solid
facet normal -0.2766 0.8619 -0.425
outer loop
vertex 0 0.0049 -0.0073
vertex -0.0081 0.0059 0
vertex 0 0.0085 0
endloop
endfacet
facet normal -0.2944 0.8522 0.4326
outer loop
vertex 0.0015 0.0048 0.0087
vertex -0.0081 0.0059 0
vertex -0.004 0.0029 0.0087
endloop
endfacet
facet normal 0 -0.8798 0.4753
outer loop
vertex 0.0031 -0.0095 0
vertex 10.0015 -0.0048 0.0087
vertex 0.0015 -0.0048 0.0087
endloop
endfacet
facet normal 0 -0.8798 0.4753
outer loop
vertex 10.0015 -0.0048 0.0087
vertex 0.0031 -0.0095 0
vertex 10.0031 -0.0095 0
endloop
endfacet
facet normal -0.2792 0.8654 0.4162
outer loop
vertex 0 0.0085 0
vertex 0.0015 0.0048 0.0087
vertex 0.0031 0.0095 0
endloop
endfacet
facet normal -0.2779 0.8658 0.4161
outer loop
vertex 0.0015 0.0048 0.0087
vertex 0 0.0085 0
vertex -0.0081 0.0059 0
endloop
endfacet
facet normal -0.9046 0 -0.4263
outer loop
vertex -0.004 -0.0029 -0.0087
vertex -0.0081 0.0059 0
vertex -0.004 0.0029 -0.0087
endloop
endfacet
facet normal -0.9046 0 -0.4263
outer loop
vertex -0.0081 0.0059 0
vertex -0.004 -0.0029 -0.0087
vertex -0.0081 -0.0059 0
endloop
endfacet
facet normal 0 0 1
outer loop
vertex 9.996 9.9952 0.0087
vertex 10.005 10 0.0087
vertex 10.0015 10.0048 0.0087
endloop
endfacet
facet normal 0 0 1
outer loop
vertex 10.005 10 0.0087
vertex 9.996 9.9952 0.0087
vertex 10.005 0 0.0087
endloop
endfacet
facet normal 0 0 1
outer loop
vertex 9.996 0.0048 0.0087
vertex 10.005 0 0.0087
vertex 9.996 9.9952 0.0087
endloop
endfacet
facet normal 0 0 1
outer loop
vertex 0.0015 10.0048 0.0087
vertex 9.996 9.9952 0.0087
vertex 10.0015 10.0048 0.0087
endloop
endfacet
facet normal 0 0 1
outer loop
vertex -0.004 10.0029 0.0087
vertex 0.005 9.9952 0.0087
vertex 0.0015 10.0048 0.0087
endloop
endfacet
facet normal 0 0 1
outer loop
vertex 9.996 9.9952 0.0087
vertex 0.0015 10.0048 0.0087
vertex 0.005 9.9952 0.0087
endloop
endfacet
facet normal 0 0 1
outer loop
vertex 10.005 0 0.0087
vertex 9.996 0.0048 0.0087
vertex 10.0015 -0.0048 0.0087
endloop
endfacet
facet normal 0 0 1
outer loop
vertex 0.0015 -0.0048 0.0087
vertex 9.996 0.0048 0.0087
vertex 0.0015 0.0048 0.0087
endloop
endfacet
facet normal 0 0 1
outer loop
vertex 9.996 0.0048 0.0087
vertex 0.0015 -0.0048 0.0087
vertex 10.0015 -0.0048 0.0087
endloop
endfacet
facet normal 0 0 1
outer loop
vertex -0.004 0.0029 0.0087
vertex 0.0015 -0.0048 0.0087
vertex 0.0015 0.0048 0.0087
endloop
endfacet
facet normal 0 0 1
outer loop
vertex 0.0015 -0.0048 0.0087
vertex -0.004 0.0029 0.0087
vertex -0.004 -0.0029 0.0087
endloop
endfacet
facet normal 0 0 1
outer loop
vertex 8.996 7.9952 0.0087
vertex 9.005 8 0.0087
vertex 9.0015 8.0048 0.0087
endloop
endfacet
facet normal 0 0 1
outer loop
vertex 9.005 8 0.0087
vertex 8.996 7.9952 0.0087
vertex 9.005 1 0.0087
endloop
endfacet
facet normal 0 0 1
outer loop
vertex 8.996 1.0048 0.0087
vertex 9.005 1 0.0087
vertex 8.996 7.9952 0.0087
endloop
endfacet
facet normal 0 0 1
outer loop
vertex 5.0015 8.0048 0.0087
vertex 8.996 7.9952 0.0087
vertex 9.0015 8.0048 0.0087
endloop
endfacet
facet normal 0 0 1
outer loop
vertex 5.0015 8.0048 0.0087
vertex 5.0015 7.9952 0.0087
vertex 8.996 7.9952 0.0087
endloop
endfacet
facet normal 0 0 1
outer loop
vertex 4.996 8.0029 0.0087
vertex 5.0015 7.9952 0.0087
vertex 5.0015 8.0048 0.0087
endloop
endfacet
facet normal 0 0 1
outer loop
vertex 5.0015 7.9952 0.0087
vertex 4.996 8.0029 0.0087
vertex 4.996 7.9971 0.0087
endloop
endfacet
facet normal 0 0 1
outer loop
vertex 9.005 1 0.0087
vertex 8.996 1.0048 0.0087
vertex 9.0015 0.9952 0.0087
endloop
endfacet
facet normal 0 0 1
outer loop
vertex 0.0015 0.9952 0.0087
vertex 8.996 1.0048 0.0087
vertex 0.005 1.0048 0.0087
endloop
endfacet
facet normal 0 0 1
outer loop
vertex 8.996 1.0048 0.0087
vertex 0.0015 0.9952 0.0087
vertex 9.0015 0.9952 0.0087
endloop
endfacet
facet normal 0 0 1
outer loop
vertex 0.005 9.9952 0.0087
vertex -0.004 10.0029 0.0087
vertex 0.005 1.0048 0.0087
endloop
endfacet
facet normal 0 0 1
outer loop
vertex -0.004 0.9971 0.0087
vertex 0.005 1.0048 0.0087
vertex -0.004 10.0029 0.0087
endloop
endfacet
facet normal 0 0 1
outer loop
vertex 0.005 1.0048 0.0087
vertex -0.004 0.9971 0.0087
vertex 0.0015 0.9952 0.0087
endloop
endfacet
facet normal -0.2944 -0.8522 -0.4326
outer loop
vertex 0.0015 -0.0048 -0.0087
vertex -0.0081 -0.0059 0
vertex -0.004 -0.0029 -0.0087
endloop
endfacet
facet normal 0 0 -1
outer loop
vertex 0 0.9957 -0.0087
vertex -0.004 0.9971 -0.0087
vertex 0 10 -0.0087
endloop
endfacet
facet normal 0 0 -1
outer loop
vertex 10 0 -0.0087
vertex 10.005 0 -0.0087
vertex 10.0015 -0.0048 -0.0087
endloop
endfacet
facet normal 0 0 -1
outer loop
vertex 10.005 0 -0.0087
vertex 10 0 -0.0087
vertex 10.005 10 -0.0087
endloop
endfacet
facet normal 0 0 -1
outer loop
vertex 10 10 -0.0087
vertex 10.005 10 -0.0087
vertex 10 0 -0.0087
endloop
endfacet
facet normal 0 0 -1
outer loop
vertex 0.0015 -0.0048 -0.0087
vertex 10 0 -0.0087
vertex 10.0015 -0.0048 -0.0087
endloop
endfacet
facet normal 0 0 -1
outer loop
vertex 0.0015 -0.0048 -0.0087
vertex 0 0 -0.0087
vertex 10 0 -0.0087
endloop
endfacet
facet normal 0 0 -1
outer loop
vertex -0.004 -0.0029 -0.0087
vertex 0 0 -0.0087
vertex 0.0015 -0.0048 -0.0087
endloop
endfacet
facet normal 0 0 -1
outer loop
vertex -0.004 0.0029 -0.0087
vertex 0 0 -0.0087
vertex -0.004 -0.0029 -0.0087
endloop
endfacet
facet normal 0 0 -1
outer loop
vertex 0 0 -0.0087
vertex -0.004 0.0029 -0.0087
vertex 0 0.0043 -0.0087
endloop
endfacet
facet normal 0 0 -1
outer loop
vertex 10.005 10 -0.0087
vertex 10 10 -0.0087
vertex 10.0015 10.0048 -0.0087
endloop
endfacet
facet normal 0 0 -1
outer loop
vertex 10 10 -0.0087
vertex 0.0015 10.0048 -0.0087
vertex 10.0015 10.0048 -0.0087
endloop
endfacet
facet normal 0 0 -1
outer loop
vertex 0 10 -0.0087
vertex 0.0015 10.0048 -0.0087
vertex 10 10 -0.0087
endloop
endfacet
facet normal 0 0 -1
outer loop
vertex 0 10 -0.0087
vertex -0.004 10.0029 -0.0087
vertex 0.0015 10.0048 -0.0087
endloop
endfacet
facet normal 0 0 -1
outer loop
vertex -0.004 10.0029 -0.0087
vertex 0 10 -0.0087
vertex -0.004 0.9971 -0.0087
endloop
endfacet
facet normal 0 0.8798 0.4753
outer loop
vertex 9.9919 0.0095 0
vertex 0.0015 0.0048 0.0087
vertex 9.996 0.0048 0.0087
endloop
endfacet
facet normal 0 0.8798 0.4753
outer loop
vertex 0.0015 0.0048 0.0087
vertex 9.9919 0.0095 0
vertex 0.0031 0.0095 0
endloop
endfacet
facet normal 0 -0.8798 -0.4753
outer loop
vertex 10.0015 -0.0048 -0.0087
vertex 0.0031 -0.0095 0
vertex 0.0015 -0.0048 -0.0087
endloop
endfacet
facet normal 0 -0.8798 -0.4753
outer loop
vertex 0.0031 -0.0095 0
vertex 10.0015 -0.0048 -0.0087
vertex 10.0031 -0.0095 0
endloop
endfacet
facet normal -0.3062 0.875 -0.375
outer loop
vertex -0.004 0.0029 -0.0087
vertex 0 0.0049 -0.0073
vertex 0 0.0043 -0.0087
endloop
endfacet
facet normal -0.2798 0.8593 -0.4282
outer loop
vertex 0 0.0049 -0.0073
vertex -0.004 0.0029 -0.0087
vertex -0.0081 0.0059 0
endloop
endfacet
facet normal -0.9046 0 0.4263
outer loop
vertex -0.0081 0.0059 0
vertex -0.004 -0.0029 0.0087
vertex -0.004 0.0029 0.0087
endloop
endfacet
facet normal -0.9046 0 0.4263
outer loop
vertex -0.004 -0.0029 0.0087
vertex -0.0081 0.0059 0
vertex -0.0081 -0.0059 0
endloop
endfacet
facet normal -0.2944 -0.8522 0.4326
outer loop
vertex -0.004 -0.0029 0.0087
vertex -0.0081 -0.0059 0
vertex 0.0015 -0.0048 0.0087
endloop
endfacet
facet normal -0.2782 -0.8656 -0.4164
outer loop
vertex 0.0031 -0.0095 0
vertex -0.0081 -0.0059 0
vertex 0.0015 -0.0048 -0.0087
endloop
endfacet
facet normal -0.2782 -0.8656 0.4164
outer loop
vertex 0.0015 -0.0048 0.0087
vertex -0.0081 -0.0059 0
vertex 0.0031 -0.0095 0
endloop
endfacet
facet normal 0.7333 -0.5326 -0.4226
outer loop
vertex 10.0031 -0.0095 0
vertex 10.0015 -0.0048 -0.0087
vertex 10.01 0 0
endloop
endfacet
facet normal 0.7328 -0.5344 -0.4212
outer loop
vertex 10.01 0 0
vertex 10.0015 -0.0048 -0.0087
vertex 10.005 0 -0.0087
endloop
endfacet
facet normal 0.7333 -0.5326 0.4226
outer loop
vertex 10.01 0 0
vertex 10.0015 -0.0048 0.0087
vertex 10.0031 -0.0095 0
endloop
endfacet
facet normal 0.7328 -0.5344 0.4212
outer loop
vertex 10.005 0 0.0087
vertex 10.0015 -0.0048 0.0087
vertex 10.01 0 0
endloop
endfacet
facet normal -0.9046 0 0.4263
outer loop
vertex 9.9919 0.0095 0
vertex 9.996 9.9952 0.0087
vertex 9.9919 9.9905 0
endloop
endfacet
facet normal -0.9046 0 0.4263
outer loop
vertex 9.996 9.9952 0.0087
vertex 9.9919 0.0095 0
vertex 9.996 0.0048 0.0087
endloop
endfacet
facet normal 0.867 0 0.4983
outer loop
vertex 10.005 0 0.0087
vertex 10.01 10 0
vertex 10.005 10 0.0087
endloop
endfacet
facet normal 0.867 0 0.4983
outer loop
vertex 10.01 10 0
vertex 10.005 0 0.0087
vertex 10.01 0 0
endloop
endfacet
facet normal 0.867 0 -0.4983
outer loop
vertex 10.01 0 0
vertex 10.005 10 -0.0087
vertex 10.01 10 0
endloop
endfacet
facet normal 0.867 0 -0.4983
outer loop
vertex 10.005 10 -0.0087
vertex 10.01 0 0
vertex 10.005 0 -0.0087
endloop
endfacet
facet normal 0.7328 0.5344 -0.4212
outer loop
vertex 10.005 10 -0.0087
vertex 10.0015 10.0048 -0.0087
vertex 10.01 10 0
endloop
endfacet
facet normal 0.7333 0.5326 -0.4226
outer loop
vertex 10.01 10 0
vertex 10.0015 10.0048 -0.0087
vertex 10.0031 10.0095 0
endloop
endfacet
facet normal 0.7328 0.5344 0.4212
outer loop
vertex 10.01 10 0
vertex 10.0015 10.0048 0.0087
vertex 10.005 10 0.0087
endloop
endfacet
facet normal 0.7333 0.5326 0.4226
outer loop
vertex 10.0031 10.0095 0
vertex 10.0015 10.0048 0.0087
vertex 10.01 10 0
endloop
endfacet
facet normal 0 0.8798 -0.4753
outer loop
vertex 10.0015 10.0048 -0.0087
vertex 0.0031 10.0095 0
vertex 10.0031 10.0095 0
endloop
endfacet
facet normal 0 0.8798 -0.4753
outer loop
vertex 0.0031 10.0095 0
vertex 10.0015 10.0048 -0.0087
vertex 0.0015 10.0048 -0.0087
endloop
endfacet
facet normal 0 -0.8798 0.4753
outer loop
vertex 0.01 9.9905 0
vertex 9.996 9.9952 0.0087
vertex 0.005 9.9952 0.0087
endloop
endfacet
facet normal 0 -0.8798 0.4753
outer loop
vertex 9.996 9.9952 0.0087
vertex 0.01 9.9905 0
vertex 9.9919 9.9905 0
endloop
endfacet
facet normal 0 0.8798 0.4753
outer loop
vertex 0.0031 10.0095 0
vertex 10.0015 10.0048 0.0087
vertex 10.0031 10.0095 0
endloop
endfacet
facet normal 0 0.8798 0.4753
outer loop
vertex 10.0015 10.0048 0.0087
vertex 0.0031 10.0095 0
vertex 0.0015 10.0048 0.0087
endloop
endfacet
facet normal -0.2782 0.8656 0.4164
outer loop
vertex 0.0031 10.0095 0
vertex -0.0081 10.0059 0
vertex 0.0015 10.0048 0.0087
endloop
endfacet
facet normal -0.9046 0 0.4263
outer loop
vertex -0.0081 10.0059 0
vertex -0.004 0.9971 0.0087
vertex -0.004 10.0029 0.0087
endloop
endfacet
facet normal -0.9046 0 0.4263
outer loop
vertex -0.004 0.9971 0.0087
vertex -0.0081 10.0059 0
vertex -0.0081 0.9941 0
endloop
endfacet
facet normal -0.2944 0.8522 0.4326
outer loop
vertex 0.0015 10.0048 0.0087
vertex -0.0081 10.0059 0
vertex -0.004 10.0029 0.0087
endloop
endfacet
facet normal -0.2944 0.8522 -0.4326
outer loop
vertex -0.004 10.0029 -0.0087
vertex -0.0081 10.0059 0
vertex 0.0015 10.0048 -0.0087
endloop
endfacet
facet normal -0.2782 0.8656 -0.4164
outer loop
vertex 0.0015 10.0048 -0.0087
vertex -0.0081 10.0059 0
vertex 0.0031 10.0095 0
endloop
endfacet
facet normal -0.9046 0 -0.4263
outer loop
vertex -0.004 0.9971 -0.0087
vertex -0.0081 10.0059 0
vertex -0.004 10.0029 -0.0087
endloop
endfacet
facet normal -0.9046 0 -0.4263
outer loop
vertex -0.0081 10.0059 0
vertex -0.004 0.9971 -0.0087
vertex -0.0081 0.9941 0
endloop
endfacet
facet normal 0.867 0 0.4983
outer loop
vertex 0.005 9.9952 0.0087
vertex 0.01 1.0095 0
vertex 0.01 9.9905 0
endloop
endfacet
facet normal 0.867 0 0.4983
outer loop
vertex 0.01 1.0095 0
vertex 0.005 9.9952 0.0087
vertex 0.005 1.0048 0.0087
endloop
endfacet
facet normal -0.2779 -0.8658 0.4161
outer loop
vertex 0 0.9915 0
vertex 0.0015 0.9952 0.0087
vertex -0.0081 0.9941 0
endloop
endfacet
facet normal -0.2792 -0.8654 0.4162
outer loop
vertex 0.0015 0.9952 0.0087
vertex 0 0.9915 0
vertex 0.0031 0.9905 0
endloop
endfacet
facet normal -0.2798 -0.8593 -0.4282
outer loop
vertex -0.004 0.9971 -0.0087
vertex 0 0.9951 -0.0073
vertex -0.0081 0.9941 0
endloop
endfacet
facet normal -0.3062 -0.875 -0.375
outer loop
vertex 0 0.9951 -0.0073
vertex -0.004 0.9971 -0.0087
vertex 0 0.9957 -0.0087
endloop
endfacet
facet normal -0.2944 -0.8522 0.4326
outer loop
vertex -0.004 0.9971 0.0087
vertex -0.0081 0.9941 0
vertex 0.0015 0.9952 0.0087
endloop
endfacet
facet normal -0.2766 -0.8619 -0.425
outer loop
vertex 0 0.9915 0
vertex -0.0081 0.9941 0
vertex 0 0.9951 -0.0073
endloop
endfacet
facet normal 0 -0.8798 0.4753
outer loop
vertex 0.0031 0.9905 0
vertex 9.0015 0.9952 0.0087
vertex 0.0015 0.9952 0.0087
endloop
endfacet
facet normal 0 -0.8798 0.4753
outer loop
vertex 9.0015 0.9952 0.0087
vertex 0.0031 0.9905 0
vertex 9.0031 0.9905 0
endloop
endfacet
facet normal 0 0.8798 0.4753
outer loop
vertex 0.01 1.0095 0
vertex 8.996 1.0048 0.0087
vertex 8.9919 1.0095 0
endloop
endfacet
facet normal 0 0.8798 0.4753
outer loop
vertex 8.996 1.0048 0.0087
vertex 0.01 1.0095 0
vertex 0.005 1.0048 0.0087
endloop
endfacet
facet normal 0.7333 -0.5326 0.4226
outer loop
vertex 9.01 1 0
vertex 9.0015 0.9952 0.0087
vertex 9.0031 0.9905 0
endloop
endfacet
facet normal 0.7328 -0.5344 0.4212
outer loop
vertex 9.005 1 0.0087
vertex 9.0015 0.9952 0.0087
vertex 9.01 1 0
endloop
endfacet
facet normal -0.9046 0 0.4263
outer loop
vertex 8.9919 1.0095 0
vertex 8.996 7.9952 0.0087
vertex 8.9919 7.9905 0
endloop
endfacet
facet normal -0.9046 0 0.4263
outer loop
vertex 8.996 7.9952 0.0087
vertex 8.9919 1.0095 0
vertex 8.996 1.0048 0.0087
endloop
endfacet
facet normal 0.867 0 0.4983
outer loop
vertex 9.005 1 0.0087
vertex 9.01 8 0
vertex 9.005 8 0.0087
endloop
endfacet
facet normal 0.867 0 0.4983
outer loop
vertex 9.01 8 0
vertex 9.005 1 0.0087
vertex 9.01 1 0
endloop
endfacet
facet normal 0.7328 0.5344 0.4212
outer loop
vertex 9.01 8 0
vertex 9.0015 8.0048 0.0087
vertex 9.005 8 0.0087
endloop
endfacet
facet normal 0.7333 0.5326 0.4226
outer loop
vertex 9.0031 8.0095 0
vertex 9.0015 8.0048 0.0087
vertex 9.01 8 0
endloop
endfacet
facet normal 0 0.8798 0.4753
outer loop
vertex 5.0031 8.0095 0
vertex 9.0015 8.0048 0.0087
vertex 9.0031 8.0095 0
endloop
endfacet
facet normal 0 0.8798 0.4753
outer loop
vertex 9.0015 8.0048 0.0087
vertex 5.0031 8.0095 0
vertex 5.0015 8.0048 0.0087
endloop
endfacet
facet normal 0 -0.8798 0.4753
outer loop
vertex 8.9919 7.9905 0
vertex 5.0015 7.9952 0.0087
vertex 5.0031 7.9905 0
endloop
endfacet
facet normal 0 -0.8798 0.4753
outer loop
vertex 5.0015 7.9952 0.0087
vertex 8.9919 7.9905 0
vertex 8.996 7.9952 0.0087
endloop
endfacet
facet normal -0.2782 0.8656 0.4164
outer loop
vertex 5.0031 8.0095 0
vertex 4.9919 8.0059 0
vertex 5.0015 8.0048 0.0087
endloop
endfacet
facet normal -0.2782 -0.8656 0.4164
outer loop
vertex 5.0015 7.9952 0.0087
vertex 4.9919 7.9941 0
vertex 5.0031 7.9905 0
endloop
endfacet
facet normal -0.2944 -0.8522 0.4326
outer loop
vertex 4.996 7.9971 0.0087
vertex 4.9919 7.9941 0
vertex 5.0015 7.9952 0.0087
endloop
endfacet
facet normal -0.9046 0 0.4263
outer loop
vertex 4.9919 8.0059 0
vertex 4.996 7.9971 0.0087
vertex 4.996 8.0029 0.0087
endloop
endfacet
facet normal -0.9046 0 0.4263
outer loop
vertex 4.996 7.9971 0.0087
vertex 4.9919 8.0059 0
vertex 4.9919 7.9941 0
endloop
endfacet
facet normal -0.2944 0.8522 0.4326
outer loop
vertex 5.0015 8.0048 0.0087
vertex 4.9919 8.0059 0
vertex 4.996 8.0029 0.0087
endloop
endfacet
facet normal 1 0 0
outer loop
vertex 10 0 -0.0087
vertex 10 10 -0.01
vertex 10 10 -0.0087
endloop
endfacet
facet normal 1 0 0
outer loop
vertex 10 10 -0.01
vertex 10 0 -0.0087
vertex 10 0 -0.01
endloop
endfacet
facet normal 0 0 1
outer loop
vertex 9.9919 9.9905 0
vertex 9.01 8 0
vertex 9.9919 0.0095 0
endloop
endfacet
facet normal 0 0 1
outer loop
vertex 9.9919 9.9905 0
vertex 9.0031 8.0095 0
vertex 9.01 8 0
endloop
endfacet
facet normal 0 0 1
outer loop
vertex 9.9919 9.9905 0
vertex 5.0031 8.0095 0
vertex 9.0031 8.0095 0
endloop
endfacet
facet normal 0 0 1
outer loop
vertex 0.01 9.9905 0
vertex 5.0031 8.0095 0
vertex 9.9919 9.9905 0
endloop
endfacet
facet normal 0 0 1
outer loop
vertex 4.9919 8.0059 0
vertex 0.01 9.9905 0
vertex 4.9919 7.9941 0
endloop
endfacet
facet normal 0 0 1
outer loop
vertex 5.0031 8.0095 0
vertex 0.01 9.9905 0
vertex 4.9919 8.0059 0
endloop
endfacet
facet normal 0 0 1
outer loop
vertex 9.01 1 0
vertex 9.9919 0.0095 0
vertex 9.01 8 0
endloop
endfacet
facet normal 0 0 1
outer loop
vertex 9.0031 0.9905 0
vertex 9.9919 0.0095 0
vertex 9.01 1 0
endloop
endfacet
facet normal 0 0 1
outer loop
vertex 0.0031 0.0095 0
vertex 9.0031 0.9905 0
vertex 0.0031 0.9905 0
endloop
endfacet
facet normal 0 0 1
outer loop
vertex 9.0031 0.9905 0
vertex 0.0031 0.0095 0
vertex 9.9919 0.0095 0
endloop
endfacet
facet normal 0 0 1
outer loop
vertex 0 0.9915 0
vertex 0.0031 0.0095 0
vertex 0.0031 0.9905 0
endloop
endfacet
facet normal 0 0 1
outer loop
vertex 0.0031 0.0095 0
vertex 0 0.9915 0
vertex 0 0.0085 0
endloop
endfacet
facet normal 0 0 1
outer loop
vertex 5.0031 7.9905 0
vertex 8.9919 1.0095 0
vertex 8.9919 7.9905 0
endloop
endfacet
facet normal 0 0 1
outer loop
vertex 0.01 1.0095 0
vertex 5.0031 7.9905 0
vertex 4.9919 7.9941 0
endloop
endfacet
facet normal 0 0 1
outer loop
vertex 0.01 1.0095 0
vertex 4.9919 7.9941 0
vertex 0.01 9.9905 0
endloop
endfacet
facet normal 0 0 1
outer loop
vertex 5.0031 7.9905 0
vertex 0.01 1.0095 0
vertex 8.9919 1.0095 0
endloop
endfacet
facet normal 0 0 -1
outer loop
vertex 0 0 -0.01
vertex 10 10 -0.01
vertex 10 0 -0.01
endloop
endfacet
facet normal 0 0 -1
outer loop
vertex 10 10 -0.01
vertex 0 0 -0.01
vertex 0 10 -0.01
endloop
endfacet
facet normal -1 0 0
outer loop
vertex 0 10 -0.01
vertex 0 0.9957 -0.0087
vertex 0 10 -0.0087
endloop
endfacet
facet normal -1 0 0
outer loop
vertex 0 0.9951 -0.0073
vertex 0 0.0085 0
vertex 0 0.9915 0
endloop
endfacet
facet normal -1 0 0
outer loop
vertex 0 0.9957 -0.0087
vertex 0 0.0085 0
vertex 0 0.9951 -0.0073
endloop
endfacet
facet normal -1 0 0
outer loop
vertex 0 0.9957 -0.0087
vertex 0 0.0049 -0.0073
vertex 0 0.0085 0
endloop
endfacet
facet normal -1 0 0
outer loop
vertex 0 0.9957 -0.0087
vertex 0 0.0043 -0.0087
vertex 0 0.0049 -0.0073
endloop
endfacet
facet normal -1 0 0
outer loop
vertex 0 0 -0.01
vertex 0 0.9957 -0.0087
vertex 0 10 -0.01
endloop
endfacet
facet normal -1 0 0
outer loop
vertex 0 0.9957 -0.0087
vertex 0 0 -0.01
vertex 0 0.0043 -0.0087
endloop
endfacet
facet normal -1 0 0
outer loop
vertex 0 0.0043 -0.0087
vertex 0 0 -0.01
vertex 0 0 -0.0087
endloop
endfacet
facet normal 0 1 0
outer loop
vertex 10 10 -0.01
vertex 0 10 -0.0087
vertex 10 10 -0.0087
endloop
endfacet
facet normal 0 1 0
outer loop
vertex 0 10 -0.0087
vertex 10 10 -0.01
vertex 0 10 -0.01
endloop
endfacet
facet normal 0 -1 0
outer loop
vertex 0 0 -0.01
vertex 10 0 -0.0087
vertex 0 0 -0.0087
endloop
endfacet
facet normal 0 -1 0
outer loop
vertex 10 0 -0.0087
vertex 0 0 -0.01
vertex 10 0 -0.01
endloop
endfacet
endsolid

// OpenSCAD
hull(){
    translate([0.0, 0.0]) sphere(0.01);
    translate([1.0, 0.0]) sphere(0.01);
}
hull(){
    translate([1.0, 0.0]) sphere(0.01);
    translate([2.0, 0.0]) sphere(0.01);
}
hull(){
    translate([2.0, 0.0]) sphere(0.01);
    translate([3.0, 0.0]) sphere(0.01);
}
hull(){
    translate([3.0, 0.0]) sphere(0.01);
    translate([4.0, 0.0]) sphere(0.01);
}
hull(){
    translate([4.0, 0.0]) sphere(0.01);
    translate([5.0, 0.0]) sphere(0.01);
}
hull(){
    translate([5.0, 0.0]) sphere(0.01);
    translate([6.0, 0.0]) sphere(0.01);
}
hull(){
    translate([6.0, 0.0]) sphere(0.01);
    translate([7.0, 0.0]) sphere(0.01);
}
hull(){
    translate([7.0, 0.0]) sphere(0.01);
    translate([8.0, 0.0]) sphere(0.01);
}
hull(){
    translate([8.0, 0.0]) sphere(0.01);
    translate([9.0, 0.0]) sphere(0.01);
}
hull(){
    translate([9.0, 0.0]) sphere(0.01);
    translate([10.0, 0.0]) sphere(0.01);
}
hull(){
    translate([10.0, 0.0]) sphere(0.01);
    translate([10.0, 1.0]) sphere(0.01);
}
hull(){
    translate([10.0, 1.0]) sphere(0.01);
    translate([10.0, 2.0]) sphere(0.01);
}
hull(){
    translate([10.0, 2.0]) sphere(0.01);
    translate([10.0, 3.0]) sphere(0.01);
}
hull(){
    translate([10.0, 3.0]) sphere(0.01);
    translate([10.0, 4.0]) sphere(0.01);
}
hull(){
    translate([10.0, 4.0]) sphere(0.01);
    translate([10.0, 5.0]) sphere(0.01);
}
hull(){
    translate([10.0, 5.0]) sphere(0.01);
    translate([10.0, 6.0]) sphere(0.01);
}
hull(){
    translate([10.0, 6.0]) sphere(0.01);
    translate([10.0, 7.0]) sphere(0.01);
}
hull(){
    translate([10.0, 7.0]) sphere(0.01);
    translate([10.0, 8.0]) sphere(0.01);
}
hull(){
    translate([10.0, 8.0]) sphere(0.01);
    translate([10.0, 9.0]) sphere(0.01);
}
hull(){
    translate([10.0, 9.0]) sphere(0.01);
    translate([10.0, 10.0]) sphere(0.01);
}
hull(){
    translate([10.0, 10.0]) sphere(0.01);
    translate([9.0, 10.0]) sphere(0.01);
}
hull(){
    translate([9.0, 10.0]) sphere(0.01);
    translate([8.0, 10.0]) sphere(0.01);
}
hull(){
    translate([8.0, 10.0]) sphere(0.01);
    translate([7.0, 10.0]) sphere(0.01);
}
hull(){
    translate([7.0, 10.0]) sphere(0.01);
    translate([6.0, 10.0]) sphere(0.01);
}
hull(){
    translate([6.0, 10.0]) sphere(0.01);
    translate([5.0, 10.0]) sphere(0.01);
}
hull(){
    translate([5.0, 10.0]) sphere(0.01);
    translate([4.0, 10.0]) sphere(0.01);
}
hull(){
    translate([4.0, 10.0]) sphere(0.01);
    translate([3.0, 10.0]) sphere(0.01);
}
hull(){
    translate([3.0, 10.0]) sphere(0.01);
    translate([2.0, 10.0]) sphere(0.01);
}
hull(){
    translate([2.0, 10.0]) sphere(0.01);
    translate([1.0, 10.0]) sphere(0.01);
}
hull(){
    translate([1.0, 10.0]) sphere(0.01);
    translate([0.0, 10.0]) sphere(0.01);
}
hull(){
    translate([0.0, 10.0]) sphere(0.01);
    translate([0.0, 9.0]) sphere(0.01);
}
hull(){
    translate([0.0, 9.0]) sphere(0.01);
    translate([0.0, 8.0]) sphere(0.01);
}
hull(){
    translate([0.0, 8.0]) sphere(0.01);
    translate([0.0, 7.0]) sphere(0.01);
}
hull(){
    translate([0.0, 7.0]) sphere(0.01);
    translate([0.0, 6.0]) sphere(0.01);
}
hull(){
    translate([0.0, 6.0]) sphere(0.01);
    translate([0.0, 5.0]) sphere(0.01);
}
hull(){
    translate([0.0, 5.0]) sphere(0.01);
    translate([0.0, 4.0]) sphere(0.01);
}
hull(){
    translate([0.0, 4.0]) sphere(0.01);
    translate([0.0, 3.0]) sphere(0.01);
}
hull(){
    translate([0.0, 3.0]) sphere(0.01);
    translate([0.0, 2.0]) sphere(0.01);
}
hull(){
    translate([0.0, 2.0]) sphere(0.01);
    translate([0.0, 1.0]) sphere(0.01);
}
hull(){
    translate([0.0, 1.0]) sphere(0.01);
    translate([1.0, 1.0]) sphere(0.01);
}
hull(){
    translate([1.0, 1.0]) sphere(0.01);
    translate([2.0, 1.0]) sphere(0.01);
}
hull(){
    translate([2.0, 1.0]) sphere(0.01);
    translate([3.0, 1.0]) sphere(0.01);
}
hull(){
    translate([3.0, 1.0]) sphere(0.01);
    translate([4.0, 1.0]) sphere(0.01);
}
hull(){
    translate([4.0, 1.0]) sphere(0.01);
    translate([5.0, 1.0]) sphere(0.01);
}
hull(){
    translate([5.0, 1.0]) sphere(0.01);
    translate([6.0, 1.0]) sphere(0.01);
}
hull(){
    translate([6.0, 1.0]) sphere(0.01);
    translate([7.0, 1.0]) sphere(0.01);
}
hull(){
    translate([7.0, 1.0]) sphere(0.01);
    translate([8.0, 1.0]) sphere(0.01);
}
hull(){
    translate([8.0, 1.0]) sphere(0.01);
    translate([9.0, 1.0]) sphere(0.01);
}
hull(){
    translate([9.0, 1.0]) sphere(0.01);
    translate([9.0, 2.0]) sphere(0.01);
}
hull(){
    translate([9.0, 2.0]) sphere(0.01);
    translate([9.0, 3.0]) sphere(0.01);
}
hull(){
    translate([9.0, 3.0]) sphere(0.01);
    translate([9.0, 4.0]) sphere(0.01);
}
hull(){
    translate([9.0, 4.0]) sphere(0.01);
    translate([9.0, 5.0]) sphere(0.01);
}
hull(){
    translate([9.0, 5.0]) sphere(0.01);
    translate([9.0, 6.0]) sphere(0.01);
}
hull(){
    translate([9.0, 6.0]) sphere(0.01);
    translate([9.0, 7.0]) sphere(0.01);
}
hull(){
    translate([9.0, 7.0]) sphere(0.01);
    translate([9.0, 8.0]) sphere(0.01);
}
hull(){
    translate([9.0, 8.0]) sphere(0.01);
    translate([8.0, 8.0]) sphere(0.01);
}
hull(){
    translate([8.0, 8.0]) sphere(0.01);
    translate([7.0, 8.0]) sphere(0.01);
}
hull(){
    translate([7.0, 8.0]) sphere(0.01);
    translate([6.0, 8.0]) sphere(0.01);
}
hull(){
    translate([6.0, 8.0]) sphere(0.01);
    translate([5.0, 8.0]) sphere(0.01);
}
translate([0,0,-0.01]) color([0.1,0.1,0.1]) cube([10,10,0.01]);
